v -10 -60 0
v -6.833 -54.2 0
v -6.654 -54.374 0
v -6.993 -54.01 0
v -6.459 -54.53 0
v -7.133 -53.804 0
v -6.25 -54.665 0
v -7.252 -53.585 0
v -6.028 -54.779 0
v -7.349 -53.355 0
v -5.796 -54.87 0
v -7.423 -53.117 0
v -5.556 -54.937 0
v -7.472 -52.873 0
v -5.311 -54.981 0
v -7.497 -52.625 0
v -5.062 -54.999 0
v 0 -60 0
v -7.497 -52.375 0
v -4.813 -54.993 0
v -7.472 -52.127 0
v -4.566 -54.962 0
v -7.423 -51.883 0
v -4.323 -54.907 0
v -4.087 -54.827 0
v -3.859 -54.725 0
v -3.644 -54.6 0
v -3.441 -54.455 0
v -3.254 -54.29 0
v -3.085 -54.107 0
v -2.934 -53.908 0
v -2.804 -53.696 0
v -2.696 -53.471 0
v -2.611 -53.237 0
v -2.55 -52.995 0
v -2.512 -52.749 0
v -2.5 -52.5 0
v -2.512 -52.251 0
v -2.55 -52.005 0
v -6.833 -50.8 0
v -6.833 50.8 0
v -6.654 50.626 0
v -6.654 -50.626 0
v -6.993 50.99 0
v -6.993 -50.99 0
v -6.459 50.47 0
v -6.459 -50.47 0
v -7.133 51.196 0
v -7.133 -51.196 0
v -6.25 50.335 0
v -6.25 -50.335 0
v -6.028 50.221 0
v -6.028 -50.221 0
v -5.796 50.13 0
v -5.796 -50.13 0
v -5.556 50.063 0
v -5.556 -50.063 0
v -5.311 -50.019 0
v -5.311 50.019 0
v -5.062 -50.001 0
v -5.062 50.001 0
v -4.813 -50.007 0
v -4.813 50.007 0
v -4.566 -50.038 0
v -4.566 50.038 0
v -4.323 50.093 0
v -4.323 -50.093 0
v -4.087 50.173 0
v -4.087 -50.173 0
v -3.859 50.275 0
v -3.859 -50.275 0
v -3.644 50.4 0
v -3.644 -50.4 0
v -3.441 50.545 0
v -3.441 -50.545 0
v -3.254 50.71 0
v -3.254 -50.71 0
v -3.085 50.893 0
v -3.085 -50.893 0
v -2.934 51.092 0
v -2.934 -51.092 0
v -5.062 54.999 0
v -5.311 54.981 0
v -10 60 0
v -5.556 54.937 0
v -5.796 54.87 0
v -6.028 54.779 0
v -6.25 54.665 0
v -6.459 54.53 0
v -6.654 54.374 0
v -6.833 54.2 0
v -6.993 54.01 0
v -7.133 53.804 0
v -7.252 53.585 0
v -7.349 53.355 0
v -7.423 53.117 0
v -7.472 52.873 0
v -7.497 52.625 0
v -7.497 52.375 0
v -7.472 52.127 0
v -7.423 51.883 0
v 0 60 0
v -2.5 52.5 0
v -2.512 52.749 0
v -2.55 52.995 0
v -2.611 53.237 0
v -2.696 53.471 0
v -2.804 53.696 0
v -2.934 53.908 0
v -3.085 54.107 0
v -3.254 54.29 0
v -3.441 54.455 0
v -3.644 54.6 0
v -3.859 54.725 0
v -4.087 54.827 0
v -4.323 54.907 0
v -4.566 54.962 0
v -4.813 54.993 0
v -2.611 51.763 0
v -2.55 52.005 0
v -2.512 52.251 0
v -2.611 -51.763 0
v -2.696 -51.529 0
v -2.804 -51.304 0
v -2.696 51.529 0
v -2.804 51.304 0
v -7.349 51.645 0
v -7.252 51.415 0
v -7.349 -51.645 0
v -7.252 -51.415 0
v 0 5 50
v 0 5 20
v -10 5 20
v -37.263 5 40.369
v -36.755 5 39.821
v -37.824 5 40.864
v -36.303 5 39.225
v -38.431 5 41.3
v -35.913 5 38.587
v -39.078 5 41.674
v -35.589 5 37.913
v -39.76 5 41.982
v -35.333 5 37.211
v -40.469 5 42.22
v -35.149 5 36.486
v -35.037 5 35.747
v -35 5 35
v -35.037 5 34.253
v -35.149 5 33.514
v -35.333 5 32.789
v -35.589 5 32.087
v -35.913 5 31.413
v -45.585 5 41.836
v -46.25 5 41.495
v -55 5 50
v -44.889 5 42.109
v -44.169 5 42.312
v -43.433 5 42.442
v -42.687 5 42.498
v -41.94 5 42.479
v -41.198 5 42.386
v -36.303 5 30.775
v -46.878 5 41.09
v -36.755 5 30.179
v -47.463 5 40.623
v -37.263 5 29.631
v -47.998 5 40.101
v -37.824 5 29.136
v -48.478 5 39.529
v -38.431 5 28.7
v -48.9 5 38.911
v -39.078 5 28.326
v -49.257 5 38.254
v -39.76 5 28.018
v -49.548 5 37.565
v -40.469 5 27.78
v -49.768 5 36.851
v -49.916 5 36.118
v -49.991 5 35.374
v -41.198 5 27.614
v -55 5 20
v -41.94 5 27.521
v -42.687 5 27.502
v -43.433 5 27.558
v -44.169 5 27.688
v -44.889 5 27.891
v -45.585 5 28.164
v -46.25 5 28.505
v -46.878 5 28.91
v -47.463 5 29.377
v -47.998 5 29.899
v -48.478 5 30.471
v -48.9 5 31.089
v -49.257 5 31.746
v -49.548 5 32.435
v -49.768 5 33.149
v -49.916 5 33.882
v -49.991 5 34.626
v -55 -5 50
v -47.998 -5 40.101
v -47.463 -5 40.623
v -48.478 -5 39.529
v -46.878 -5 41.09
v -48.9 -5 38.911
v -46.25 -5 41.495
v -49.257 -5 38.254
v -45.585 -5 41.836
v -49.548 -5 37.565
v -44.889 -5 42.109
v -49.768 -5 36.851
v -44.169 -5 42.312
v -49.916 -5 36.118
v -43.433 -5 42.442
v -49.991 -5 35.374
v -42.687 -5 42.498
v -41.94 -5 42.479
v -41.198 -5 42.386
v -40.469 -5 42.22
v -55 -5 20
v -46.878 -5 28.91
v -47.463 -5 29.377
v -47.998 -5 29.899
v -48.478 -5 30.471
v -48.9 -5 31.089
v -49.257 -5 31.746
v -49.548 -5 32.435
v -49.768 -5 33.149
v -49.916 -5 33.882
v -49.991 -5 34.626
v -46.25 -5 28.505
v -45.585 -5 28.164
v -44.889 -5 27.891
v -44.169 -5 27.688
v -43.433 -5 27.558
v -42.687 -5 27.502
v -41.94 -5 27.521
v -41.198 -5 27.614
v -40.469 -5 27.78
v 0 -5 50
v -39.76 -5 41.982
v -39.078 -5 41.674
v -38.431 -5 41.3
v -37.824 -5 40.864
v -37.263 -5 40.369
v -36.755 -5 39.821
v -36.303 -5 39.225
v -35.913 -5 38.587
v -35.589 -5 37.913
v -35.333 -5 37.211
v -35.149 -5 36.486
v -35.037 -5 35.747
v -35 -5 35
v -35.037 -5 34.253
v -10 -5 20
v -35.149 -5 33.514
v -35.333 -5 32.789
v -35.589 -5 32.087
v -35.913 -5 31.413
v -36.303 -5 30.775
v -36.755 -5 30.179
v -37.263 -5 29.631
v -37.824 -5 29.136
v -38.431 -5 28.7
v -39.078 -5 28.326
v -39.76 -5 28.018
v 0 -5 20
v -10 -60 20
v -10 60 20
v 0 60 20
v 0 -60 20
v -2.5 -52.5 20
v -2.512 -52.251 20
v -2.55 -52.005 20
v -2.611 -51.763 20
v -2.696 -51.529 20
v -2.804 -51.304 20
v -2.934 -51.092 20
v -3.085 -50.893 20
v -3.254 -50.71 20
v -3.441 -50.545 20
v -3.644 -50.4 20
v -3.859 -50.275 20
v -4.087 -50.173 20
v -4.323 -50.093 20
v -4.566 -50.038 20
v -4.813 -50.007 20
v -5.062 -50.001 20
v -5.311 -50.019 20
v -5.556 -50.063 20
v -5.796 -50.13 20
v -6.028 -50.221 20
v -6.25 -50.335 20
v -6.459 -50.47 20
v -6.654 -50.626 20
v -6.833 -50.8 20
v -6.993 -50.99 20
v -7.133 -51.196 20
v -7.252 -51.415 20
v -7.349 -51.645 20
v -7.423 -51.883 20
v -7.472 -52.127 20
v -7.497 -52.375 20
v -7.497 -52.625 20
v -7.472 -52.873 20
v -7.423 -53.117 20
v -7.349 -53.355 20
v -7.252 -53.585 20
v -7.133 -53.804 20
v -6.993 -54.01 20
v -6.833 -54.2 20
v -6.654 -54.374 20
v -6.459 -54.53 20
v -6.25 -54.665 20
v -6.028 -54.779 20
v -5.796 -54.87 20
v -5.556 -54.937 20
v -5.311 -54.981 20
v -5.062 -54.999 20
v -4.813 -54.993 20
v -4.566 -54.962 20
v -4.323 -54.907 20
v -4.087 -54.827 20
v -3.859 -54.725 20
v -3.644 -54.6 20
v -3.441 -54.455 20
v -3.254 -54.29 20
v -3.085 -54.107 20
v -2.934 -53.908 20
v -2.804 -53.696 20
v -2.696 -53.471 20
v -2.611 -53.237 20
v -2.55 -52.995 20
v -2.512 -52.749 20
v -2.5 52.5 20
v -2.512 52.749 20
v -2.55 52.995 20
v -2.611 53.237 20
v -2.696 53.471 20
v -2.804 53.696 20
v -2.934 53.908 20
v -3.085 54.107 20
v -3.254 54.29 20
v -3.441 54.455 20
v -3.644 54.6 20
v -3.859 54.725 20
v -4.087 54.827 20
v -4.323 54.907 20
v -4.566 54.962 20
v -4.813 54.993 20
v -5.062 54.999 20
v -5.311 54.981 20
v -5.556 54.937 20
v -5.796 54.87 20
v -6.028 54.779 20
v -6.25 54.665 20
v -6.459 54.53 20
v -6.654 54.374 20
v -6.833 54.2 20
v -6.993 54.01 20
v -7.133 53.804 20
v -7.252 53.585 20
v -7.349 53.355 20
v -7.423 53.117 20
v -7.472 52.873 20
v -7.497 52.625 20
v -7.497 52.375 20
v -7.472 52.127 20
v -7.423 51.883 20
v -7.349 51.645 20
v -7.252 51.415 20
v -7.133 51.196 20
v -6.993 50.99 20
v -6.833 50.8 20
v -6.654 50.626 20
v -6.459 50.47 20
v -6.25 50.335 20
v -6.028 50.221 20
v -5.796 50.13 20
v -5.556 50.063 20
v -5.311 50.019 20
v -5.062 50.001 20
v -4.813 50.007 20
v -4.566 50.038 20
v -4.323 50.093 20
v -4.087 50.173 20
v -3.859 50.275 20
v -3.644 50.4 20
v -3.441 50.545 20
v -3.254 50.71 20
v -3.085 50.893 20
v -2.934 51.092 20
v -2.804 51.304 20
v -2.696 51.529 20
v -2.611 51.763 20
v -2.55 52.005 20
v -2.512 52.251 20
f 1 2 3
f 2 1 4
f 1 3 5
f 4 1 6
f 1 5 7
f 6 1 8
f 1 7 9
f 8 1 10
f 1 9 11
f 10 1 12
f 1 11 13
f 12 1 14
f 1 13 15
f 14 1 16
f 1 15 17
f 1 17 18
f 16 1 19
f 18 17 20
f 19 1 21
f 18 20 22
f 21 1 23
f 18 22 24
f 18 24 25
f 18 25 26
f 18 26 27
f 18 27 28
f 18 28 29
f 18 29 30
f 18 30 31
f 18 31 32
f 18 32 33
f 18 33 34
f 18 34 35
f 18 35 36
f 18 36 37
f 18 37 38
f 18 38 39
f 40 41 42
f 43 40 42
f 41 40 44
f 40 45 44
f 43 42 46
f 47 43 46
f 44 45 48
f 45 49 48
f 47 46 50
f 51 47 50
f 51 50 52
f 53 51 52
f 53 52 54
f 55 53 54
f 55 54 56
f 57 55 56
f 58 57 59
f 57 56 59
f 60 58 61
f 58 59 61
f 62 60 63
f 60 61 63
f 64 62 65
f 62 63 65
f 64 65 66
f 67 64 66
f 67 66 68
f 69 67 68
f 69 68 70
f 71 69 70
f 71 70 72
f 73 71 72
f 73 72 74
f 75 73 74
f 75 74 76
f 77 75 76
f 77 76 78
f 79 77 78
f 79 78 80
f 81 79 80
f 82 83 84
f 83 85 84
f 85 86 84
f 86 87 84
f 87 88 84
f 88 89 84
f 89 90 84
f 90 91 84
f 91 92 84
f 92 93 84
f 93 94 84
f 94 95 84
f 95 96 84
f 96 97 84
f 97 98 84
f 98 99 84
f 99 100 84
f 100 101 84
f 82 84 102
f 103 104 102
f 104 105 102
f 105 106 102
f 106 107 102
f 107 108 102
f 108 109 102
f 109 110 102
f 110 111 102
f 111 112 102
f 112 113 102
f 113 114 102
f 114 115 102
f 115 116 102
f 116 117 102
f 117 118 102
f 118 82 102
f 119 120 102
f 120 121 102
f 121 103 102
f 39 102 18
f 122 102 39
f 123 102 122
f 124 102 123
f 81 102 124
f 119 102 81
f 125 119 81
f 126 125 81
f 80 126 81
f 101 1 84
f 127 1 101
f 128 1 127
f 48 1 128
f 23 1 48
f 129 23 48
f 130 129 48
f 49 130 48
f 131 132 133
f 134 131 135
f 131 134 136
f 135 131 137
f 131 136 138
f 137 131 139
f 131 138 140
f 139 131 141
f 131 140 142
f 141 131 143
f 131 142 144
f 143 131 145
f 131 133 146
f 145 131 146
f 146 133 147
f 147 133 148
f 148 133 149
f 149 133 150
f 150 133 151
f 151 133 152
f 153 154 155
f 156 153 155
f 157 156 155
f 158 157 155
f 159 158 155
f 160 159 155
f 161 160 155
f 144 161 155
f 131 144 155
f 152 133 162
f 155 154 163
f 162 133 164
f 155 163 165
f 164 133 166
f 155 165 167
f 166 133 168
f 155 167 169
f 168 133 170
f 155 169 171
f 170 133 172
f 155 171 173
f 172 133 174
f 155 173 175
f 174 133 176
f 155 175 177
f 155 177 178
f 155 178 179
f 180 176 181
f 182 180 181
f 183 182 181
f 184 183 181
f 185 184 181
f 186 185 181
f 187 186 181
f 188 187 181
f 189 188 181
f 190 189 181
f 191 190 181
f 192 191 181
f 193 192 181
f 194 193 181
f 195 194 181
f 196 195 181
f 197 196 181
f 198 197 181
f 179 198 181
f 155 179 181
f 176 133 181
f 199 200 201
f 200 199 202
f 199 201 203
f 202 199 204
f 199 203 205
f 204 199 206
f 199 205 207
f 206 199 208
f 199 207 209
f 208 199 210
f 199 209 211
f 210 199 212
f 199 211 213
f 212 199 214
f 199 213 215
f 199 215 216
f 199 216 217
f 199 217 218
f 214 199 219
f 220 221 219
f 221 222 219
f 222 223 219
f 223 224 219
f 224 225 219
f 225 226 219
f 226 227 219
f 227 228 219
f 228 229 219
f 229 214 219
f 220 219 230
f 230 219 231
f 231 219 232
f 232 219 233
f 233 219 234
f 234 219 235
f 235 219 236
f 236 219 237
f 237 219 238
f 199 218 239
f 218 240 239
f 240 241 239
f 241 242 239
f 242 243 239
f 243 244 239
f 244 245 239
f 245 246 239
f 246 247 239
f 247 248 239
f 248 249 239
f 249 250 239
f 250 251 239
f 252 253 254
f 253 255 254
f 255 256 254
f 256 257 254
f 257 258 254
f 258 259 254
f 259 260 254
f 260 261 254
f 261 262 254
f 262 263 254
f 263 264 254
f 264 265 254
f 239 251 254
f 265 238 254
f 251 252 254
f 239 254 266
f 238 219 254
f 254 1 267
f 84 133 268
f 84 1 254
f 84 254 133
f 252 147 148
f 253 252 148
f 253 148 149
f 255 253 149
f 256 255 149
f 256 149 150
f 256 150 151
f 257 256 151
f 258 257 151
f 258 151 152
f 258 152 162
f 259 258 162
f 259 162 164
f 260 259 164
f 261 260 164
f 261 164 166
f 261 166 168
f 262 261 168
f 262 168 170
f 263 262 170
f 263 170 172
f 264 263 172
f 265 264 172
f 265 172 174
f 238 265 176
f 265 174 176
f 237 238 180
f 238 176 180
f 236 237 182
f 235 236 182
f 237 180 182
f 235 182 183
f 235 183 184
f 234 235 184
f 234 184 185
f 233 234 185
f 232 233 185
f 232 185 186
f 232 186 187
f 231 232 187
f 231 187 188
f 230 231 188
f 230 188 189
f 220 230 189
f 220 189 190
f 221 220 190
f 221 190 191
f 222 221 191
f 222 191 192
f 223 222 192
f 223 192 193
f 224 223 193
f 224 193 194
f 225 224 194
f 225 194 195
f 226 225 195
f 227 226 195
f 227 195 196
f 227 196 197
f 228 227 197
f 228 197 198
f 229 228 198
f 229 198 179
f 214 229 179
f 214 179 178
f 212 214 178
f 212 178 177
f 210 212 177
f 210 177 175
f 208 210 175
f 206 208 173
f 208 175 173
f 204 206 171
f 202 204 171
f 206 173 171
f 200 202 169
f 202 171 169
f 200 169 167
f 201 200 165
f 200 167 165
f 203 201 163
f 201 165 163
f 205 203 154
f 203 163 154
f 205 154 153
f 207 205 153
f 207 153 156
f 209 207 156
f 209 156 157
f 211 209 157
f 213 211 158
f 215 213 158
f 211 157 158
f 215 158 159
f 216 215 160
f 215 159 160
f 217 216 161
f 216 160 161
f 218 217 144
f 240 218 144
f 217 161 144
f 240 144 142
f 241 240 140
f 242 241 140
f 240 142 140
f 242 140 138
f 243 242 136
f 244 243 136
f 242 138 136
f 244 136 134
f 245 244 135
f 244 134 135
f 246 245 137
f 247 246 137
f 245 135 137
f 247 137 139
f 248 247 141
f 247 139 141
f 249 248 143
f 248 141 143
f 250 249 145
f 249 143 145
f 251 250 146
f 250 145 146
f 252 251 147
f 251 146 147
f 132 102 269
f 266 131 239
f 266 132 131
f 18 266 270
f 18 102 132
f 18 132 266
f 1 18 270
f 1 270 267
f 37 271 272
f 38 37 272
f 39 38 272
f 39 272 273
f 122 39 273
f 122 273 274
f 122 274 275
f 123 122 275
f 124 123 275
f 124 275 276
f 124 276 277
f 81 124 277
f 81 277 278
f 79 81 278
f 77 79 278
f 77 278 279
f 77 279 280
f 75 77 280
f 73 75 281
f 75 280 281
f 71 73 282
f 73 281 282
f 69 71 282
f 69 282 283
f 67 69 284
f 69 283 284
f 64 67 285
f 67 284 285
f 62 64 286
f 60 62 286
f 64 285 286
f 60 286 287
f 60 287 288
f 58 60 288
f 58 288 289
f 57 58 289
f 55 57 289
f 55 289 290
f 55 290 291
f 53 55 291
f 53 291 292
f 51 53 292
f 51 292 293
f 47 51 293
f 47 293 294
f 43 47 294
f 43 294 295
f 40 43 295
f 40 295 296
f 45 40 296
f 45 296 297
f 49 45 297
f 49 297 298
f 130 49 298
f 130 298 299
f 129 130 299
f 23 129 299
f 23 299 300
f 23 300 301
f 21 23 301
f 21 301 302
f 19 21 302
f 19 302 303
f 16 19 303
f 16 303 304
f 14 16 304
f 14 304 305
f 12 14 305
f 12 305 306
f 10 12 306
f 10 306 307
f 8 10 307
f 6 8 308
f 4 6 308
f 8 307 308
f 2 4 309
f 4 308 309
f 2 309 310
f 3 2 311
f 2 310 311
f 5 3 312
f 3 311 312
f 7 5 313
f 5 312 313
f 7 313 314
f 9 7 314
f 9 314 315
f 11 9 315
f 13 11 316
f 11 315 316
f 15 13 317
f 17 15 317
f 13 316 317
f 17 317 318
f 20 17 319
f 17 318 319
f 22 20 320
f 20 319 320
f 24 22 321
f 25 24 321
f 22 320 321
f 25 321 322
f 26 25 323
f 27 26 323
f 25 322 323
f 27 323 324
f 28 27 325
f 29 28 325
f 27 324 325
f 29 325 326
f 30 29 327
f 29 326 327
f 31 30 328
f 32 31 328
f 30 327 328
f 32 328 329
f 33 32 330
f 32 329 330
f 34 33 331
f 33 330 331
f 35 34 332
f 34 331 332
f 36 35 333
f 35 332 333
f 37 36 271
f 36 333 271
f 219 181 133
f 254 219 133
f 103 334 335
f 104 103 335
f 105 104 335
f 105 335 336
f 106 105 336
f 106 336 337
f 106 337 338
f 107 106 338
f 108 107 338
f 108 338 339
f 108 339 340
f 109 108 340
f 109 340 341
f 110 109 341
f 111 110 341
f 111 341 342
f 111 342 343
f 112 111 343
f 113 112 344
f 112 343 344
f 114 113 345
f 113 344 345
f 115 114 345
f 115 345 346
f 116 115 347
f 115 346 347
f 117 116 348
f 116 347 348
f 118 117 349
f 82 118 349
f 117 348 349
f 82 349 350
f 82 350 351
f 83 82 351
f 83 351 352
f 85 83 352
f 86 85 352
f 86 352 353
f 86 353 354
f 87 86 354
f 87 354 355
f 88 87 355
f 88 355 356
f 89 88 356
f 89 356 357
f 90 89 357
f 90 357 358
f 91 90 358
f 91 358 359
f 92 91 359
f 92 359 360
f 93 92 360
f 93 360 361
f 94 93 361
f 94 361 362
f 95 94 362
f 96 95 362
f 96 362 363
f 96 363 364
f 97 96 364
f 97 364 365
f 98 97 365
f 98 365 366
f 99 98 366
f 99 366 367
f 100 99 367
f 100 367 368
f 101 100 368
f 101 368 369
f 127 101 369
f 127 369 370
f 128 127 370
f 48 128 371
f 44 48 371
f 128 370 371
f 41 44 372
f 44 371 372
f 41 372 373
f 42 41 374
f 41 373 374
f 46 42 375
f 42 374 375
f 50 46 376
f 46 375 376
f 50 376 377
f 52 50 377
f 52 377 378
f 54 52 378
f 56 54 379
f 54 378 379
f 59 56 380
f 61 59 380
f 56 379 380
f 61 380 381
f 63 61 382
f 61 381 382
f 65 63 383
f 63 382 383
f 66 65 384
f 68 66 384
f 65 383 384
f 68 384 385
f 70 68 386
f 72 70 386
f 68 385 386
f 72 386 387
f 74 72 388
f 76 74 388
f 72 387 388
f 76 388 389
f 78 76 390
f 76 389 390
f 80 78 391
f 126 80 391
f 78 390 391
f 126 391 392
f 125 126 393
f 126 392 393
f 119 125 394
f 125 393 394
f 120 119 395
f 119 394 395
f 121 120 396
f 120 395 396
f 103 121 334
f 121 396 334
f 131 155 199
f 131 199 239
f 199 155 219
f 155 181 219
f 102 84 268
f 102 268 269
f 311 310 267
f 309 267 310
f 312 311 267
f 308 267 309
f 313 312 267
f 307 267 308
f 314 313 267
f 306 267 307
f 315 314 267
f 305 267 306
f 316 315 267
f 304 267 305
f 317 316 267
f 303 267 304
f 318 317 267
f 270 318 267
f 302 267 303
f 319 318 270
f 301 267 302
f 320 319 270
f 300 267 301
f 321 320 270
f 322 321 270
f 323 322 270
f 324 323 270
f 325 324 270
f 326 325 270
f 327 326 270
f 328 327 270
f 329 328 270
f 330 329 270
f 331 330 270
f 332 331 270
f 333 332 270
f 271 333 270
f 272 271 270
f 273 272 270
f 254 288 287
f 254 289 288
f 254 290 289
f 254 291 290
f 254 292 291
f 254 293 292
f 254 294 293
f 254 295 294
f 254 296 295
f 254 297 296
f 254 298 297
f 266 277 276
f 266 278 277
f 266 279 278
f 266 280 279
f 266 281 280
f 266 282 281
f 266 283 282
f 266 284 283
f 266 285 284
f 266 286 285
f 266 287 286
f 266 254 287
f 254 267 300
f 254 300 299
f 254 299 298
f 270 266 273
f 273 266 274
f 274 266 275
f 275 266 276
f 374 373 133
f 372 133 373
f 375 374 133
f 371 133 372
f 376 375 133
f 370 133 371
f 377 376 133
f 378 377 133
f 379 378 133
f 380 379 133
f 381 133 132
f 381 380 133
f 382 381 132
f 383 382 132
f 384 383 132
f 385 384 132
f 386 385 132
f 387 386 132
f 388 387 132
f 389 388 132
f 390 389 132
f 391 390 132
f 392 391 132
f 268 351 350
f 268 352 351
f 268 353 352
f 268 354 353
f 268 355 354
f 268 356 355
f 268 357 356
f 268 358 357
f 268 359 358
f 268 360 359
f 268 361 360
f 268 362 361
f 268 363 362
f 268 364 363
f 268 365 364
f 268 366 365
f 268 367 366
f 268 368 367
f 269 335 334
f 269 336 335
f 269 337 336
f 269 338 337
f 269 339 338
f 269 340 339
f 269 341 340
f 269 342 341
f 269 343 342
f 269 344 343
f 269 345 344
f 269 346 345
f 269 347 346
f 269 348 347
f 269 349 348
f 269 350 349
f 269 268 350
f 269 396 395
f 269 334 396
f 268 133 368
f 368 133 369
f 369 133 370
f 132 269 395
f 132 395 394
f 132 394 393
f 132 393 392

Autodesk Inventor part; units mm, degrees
ref_plane "YZ Plane" through (0, 0, 0) normal (1, 0, 0) x (0, 1, 0)
ref_plane "XZ Plane" through (0, 0, 0) normal (0, 1, 0) x (-1, 0, 0)
ref_plane "XY Plane" through (0, 0, 0) normal (0, 0, 1) x (1, 0, 0)
sketch "Sketch1" plane through (0, 0, 0) normal (0, 0, 1) x (1, 0, 0)
  line L0 (0, 60) -> (0, -60)
  line L1 (0, -60) -> (-10, -60)
  line L2 (-10, -60) -> (-10, 60)
  line L3 (-10, 60) -> (0, 60)
  point P0 (0, 0)
  dimension "d27" = 120
  dimension "d28" = 10
extrude "Extrusion1" add sketch "Sketch1" along normal blind 20
sketch "Sketch2" plane through (0, 0, 20) normal (0, 0, 1) x (1, 0, 0)
  line L0 (0, 5) -> (0, -5)
  line L1 (0, -50) -> (0, 50) projected
  line L2 (0, 5) -> (-55, 5)
  line L3 (-55, 5) -> (-55, -5)
  line L4 (-55, -5) -> (0, -5)
  point P0 (0, 0)
  dimension "d5" = 10
  dimension "d6" = 55
  dimension "d7" = 10
extrude "Extrusion2" add sketch "Sketch2" along normal blind 30
sketch "Sketch3" plane through (-55, 5, 20) normal (0, 1, 0) x (1, 0, 0)
  line L0 (0, 0) -> (0, -30) projected
  line L1 (0, 0) -> (45, 0) projected
  line L2 (0, -30) -> (55, -30) projected
  circle A0 centre (12.5, -15) radius 7.5
  point P0 (55, 20)
  dimension "d12" = 15
extrude "Extrusion3" cut sketch "Sketch3" against normal blind 10
sketch "Sketch6" plane through (0, 0, 20) normal (0, 0, 1) x (1, 0, 0)
  circle A0 centre (-5, -52.5) radius 2.5
  circle A1 centre (-5, 52.5) radius 2.5
  point P0 (0, 0)
  dimension "d29" = 5
  dimension "d30" = 5
extrude "Extrusion6" cut sketch "Sketch6" against normal up to surface (20 mm away)
thread "Thread2" size "M15x1.5" class "6H" standard "ANSI Metric M Profile" length 10
properties part number "steering_connector[1]" material "Wood (Birch)"
